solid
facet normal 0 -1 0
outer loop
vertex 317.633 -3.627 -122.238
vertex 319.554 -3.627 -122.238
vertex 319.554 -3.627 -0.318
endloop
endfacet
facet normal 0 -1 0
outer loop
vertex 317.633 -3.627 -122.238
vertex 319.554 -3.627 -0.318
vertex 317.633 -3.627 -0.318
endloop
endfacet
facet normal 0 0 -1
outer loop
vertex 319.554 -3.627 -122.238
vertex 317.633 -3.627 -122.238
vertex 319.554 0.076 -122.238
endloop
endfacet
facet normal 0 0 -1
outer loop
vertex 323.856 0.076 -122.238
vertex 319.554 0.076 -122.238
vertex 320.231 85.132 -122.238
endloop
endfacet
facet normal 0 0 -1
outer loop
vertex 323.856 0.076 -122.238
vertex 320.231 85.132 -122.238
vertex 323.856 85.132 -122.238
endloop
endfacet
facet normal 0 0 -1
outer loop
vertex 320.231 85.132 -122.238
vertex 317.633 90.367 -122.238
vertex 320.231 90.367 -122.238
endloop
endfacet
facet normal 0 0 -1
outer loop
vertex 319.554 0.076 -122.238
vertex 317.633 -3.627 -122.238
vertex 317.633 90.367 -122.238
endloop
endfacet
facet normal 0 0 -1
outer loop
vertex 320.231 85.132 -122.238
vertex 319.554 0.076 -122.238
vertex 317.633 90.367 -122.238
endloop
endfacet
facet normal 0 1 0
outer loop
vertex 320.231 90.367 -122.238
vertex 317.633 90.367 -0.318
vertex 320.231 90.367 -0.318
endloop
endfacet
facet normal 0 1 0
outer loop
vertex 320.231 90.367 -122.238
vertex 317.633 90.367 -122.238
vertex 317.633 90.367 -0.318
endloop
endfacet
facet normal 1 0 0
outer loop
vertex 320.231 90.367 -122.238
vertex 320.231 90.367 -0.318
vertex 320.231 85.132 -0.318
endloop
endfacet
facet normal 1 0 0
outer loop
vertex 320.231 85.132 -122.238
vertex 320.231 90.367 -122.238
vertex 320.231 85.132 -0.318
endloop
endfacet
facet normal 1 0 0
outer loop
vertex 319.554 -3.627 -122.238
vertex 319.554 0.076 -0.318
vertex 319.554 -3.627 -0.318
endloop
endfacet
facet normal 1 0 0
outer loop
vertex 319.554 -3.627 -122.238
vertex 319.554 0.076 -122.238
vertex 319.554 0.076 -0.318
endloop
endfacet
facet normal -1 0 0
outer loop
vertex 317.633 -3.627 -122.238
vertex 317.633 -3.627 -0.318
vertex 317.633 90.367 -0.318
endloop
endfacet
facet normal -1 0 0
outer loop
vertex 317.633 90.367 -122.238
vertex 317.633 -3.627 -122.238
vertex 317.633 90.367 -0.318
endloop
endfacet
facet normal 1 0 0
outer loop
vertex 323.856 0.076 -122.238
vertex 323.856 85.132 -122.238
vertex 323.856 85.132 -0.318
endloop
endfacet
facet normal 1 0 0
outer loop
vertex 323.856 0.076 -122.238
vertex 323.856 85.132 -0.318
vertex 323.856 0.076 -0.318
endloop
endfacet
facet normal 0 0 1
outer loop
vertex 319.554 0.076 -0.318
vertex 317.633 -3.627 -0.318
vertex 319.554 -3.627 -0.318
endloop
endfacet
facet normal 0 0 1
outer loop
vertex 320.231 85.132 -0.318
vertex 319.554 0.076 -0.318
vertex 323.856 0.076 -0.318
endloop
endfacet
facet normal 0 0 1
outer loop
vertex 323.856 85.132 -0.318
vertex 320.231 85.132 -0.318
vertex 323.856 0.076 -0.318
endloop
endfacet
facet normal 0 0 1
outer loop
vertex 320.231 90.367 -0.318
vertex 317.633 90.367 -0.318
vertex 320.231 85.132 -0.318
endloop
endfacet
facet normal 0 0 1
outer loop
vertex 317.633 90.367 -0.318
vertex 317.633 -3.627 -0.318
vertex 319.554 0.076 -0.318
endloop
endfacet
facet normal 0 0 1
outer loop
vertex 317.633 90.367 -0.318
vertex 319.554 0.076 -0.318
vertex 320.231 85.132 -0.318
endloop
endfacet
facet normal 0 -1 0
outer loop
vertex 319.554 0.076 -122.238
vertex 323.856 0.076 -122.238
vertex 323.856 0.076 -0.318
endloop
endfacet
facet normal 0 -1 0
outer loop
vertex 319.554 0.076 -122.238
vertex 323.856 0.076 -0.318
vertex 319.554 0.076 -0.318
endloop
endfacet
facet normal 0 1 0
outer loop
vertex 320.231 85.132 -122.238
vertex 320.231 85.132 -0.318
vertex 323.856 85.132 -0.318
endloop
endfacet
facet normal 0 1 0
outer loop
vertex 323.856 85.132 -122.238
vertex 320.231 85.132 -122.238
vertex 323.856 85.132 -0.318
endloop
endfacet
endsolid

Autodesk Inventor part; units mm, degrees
ref_plane "YZ Plane" through (0, 0, 0) normal (1, 0, 0) x (0, 1, 0)
ref_plane "XZ Plane" through (0, 0, 0) normal (0, 1, 0) x (-1, 0, 0)
ref_plane "XY Plane" through (0, 0, 0) normal (0, 0, 1) x (1, 0, 0)
ref_plane "Work Plane1" through (142.24, 53.9873, -122.2375) normal (0, 0, 1) x (1, 0, 0)
sketch "Sketch1" plane through (142.24, 53.9873, -122.2375) normal (0, 0, 1) x (1, 0, 0)
  line L0 (174.6949, 37.0783) -> (178.6893, 37.0783) projected
  line L1 (174.6949, -58.3128) -> (174.6949, 37.0783) projected
  line L2 (178.0128, -58.3128) -> (174.6949, -58.3128) projected
  line L3 (178.0128, -54.6097) -> (178.0128, -58.3128) projected
  line L4 (182.3149, -54.6097) -> (178.0128, -54.6097) projected
  line L5 (182.3149, 31.8435) -> (182.3149, -54.6097) projected
  line L6 (178.6893, 31.8435) -> (182.3149, 31.8435) projected
  line L7 (178.6893, 37.0783) -> (178.6893, 31.8435) projected
  line L8 (181.6164, -53.9112) -> (177.3143, -53.9112)
  line L9 (177.3143, -53.9112) -> (177.3143, -57.6143)
  line L10 (177.3143, -57.6143) -> (175.3934, -57.6143)
  line L11 (175.3934, -57.6143) -> (175.3934, 36.3798)
  line L12 (175.3934, 36.3798) -> (177.9908, 36.3798)
  line L13 (177.9908, 36.3798) -> (177.9908, 31.145)
  line L14 (177.9908, 31.145) -> (181.6164, 31.145)
  line L15 (181.6164, 31.145) -> (181.6164, -53.9112)
  point P0 (-142.24, -53.9873)
  dimension "d0" = 0.6985
extrude "Extrusion1" add sketch "Sketch1" along normal blind 121.92 contours L8 L9 L10 L11 L12 L13 L14 L15
properties part number "Panel"
